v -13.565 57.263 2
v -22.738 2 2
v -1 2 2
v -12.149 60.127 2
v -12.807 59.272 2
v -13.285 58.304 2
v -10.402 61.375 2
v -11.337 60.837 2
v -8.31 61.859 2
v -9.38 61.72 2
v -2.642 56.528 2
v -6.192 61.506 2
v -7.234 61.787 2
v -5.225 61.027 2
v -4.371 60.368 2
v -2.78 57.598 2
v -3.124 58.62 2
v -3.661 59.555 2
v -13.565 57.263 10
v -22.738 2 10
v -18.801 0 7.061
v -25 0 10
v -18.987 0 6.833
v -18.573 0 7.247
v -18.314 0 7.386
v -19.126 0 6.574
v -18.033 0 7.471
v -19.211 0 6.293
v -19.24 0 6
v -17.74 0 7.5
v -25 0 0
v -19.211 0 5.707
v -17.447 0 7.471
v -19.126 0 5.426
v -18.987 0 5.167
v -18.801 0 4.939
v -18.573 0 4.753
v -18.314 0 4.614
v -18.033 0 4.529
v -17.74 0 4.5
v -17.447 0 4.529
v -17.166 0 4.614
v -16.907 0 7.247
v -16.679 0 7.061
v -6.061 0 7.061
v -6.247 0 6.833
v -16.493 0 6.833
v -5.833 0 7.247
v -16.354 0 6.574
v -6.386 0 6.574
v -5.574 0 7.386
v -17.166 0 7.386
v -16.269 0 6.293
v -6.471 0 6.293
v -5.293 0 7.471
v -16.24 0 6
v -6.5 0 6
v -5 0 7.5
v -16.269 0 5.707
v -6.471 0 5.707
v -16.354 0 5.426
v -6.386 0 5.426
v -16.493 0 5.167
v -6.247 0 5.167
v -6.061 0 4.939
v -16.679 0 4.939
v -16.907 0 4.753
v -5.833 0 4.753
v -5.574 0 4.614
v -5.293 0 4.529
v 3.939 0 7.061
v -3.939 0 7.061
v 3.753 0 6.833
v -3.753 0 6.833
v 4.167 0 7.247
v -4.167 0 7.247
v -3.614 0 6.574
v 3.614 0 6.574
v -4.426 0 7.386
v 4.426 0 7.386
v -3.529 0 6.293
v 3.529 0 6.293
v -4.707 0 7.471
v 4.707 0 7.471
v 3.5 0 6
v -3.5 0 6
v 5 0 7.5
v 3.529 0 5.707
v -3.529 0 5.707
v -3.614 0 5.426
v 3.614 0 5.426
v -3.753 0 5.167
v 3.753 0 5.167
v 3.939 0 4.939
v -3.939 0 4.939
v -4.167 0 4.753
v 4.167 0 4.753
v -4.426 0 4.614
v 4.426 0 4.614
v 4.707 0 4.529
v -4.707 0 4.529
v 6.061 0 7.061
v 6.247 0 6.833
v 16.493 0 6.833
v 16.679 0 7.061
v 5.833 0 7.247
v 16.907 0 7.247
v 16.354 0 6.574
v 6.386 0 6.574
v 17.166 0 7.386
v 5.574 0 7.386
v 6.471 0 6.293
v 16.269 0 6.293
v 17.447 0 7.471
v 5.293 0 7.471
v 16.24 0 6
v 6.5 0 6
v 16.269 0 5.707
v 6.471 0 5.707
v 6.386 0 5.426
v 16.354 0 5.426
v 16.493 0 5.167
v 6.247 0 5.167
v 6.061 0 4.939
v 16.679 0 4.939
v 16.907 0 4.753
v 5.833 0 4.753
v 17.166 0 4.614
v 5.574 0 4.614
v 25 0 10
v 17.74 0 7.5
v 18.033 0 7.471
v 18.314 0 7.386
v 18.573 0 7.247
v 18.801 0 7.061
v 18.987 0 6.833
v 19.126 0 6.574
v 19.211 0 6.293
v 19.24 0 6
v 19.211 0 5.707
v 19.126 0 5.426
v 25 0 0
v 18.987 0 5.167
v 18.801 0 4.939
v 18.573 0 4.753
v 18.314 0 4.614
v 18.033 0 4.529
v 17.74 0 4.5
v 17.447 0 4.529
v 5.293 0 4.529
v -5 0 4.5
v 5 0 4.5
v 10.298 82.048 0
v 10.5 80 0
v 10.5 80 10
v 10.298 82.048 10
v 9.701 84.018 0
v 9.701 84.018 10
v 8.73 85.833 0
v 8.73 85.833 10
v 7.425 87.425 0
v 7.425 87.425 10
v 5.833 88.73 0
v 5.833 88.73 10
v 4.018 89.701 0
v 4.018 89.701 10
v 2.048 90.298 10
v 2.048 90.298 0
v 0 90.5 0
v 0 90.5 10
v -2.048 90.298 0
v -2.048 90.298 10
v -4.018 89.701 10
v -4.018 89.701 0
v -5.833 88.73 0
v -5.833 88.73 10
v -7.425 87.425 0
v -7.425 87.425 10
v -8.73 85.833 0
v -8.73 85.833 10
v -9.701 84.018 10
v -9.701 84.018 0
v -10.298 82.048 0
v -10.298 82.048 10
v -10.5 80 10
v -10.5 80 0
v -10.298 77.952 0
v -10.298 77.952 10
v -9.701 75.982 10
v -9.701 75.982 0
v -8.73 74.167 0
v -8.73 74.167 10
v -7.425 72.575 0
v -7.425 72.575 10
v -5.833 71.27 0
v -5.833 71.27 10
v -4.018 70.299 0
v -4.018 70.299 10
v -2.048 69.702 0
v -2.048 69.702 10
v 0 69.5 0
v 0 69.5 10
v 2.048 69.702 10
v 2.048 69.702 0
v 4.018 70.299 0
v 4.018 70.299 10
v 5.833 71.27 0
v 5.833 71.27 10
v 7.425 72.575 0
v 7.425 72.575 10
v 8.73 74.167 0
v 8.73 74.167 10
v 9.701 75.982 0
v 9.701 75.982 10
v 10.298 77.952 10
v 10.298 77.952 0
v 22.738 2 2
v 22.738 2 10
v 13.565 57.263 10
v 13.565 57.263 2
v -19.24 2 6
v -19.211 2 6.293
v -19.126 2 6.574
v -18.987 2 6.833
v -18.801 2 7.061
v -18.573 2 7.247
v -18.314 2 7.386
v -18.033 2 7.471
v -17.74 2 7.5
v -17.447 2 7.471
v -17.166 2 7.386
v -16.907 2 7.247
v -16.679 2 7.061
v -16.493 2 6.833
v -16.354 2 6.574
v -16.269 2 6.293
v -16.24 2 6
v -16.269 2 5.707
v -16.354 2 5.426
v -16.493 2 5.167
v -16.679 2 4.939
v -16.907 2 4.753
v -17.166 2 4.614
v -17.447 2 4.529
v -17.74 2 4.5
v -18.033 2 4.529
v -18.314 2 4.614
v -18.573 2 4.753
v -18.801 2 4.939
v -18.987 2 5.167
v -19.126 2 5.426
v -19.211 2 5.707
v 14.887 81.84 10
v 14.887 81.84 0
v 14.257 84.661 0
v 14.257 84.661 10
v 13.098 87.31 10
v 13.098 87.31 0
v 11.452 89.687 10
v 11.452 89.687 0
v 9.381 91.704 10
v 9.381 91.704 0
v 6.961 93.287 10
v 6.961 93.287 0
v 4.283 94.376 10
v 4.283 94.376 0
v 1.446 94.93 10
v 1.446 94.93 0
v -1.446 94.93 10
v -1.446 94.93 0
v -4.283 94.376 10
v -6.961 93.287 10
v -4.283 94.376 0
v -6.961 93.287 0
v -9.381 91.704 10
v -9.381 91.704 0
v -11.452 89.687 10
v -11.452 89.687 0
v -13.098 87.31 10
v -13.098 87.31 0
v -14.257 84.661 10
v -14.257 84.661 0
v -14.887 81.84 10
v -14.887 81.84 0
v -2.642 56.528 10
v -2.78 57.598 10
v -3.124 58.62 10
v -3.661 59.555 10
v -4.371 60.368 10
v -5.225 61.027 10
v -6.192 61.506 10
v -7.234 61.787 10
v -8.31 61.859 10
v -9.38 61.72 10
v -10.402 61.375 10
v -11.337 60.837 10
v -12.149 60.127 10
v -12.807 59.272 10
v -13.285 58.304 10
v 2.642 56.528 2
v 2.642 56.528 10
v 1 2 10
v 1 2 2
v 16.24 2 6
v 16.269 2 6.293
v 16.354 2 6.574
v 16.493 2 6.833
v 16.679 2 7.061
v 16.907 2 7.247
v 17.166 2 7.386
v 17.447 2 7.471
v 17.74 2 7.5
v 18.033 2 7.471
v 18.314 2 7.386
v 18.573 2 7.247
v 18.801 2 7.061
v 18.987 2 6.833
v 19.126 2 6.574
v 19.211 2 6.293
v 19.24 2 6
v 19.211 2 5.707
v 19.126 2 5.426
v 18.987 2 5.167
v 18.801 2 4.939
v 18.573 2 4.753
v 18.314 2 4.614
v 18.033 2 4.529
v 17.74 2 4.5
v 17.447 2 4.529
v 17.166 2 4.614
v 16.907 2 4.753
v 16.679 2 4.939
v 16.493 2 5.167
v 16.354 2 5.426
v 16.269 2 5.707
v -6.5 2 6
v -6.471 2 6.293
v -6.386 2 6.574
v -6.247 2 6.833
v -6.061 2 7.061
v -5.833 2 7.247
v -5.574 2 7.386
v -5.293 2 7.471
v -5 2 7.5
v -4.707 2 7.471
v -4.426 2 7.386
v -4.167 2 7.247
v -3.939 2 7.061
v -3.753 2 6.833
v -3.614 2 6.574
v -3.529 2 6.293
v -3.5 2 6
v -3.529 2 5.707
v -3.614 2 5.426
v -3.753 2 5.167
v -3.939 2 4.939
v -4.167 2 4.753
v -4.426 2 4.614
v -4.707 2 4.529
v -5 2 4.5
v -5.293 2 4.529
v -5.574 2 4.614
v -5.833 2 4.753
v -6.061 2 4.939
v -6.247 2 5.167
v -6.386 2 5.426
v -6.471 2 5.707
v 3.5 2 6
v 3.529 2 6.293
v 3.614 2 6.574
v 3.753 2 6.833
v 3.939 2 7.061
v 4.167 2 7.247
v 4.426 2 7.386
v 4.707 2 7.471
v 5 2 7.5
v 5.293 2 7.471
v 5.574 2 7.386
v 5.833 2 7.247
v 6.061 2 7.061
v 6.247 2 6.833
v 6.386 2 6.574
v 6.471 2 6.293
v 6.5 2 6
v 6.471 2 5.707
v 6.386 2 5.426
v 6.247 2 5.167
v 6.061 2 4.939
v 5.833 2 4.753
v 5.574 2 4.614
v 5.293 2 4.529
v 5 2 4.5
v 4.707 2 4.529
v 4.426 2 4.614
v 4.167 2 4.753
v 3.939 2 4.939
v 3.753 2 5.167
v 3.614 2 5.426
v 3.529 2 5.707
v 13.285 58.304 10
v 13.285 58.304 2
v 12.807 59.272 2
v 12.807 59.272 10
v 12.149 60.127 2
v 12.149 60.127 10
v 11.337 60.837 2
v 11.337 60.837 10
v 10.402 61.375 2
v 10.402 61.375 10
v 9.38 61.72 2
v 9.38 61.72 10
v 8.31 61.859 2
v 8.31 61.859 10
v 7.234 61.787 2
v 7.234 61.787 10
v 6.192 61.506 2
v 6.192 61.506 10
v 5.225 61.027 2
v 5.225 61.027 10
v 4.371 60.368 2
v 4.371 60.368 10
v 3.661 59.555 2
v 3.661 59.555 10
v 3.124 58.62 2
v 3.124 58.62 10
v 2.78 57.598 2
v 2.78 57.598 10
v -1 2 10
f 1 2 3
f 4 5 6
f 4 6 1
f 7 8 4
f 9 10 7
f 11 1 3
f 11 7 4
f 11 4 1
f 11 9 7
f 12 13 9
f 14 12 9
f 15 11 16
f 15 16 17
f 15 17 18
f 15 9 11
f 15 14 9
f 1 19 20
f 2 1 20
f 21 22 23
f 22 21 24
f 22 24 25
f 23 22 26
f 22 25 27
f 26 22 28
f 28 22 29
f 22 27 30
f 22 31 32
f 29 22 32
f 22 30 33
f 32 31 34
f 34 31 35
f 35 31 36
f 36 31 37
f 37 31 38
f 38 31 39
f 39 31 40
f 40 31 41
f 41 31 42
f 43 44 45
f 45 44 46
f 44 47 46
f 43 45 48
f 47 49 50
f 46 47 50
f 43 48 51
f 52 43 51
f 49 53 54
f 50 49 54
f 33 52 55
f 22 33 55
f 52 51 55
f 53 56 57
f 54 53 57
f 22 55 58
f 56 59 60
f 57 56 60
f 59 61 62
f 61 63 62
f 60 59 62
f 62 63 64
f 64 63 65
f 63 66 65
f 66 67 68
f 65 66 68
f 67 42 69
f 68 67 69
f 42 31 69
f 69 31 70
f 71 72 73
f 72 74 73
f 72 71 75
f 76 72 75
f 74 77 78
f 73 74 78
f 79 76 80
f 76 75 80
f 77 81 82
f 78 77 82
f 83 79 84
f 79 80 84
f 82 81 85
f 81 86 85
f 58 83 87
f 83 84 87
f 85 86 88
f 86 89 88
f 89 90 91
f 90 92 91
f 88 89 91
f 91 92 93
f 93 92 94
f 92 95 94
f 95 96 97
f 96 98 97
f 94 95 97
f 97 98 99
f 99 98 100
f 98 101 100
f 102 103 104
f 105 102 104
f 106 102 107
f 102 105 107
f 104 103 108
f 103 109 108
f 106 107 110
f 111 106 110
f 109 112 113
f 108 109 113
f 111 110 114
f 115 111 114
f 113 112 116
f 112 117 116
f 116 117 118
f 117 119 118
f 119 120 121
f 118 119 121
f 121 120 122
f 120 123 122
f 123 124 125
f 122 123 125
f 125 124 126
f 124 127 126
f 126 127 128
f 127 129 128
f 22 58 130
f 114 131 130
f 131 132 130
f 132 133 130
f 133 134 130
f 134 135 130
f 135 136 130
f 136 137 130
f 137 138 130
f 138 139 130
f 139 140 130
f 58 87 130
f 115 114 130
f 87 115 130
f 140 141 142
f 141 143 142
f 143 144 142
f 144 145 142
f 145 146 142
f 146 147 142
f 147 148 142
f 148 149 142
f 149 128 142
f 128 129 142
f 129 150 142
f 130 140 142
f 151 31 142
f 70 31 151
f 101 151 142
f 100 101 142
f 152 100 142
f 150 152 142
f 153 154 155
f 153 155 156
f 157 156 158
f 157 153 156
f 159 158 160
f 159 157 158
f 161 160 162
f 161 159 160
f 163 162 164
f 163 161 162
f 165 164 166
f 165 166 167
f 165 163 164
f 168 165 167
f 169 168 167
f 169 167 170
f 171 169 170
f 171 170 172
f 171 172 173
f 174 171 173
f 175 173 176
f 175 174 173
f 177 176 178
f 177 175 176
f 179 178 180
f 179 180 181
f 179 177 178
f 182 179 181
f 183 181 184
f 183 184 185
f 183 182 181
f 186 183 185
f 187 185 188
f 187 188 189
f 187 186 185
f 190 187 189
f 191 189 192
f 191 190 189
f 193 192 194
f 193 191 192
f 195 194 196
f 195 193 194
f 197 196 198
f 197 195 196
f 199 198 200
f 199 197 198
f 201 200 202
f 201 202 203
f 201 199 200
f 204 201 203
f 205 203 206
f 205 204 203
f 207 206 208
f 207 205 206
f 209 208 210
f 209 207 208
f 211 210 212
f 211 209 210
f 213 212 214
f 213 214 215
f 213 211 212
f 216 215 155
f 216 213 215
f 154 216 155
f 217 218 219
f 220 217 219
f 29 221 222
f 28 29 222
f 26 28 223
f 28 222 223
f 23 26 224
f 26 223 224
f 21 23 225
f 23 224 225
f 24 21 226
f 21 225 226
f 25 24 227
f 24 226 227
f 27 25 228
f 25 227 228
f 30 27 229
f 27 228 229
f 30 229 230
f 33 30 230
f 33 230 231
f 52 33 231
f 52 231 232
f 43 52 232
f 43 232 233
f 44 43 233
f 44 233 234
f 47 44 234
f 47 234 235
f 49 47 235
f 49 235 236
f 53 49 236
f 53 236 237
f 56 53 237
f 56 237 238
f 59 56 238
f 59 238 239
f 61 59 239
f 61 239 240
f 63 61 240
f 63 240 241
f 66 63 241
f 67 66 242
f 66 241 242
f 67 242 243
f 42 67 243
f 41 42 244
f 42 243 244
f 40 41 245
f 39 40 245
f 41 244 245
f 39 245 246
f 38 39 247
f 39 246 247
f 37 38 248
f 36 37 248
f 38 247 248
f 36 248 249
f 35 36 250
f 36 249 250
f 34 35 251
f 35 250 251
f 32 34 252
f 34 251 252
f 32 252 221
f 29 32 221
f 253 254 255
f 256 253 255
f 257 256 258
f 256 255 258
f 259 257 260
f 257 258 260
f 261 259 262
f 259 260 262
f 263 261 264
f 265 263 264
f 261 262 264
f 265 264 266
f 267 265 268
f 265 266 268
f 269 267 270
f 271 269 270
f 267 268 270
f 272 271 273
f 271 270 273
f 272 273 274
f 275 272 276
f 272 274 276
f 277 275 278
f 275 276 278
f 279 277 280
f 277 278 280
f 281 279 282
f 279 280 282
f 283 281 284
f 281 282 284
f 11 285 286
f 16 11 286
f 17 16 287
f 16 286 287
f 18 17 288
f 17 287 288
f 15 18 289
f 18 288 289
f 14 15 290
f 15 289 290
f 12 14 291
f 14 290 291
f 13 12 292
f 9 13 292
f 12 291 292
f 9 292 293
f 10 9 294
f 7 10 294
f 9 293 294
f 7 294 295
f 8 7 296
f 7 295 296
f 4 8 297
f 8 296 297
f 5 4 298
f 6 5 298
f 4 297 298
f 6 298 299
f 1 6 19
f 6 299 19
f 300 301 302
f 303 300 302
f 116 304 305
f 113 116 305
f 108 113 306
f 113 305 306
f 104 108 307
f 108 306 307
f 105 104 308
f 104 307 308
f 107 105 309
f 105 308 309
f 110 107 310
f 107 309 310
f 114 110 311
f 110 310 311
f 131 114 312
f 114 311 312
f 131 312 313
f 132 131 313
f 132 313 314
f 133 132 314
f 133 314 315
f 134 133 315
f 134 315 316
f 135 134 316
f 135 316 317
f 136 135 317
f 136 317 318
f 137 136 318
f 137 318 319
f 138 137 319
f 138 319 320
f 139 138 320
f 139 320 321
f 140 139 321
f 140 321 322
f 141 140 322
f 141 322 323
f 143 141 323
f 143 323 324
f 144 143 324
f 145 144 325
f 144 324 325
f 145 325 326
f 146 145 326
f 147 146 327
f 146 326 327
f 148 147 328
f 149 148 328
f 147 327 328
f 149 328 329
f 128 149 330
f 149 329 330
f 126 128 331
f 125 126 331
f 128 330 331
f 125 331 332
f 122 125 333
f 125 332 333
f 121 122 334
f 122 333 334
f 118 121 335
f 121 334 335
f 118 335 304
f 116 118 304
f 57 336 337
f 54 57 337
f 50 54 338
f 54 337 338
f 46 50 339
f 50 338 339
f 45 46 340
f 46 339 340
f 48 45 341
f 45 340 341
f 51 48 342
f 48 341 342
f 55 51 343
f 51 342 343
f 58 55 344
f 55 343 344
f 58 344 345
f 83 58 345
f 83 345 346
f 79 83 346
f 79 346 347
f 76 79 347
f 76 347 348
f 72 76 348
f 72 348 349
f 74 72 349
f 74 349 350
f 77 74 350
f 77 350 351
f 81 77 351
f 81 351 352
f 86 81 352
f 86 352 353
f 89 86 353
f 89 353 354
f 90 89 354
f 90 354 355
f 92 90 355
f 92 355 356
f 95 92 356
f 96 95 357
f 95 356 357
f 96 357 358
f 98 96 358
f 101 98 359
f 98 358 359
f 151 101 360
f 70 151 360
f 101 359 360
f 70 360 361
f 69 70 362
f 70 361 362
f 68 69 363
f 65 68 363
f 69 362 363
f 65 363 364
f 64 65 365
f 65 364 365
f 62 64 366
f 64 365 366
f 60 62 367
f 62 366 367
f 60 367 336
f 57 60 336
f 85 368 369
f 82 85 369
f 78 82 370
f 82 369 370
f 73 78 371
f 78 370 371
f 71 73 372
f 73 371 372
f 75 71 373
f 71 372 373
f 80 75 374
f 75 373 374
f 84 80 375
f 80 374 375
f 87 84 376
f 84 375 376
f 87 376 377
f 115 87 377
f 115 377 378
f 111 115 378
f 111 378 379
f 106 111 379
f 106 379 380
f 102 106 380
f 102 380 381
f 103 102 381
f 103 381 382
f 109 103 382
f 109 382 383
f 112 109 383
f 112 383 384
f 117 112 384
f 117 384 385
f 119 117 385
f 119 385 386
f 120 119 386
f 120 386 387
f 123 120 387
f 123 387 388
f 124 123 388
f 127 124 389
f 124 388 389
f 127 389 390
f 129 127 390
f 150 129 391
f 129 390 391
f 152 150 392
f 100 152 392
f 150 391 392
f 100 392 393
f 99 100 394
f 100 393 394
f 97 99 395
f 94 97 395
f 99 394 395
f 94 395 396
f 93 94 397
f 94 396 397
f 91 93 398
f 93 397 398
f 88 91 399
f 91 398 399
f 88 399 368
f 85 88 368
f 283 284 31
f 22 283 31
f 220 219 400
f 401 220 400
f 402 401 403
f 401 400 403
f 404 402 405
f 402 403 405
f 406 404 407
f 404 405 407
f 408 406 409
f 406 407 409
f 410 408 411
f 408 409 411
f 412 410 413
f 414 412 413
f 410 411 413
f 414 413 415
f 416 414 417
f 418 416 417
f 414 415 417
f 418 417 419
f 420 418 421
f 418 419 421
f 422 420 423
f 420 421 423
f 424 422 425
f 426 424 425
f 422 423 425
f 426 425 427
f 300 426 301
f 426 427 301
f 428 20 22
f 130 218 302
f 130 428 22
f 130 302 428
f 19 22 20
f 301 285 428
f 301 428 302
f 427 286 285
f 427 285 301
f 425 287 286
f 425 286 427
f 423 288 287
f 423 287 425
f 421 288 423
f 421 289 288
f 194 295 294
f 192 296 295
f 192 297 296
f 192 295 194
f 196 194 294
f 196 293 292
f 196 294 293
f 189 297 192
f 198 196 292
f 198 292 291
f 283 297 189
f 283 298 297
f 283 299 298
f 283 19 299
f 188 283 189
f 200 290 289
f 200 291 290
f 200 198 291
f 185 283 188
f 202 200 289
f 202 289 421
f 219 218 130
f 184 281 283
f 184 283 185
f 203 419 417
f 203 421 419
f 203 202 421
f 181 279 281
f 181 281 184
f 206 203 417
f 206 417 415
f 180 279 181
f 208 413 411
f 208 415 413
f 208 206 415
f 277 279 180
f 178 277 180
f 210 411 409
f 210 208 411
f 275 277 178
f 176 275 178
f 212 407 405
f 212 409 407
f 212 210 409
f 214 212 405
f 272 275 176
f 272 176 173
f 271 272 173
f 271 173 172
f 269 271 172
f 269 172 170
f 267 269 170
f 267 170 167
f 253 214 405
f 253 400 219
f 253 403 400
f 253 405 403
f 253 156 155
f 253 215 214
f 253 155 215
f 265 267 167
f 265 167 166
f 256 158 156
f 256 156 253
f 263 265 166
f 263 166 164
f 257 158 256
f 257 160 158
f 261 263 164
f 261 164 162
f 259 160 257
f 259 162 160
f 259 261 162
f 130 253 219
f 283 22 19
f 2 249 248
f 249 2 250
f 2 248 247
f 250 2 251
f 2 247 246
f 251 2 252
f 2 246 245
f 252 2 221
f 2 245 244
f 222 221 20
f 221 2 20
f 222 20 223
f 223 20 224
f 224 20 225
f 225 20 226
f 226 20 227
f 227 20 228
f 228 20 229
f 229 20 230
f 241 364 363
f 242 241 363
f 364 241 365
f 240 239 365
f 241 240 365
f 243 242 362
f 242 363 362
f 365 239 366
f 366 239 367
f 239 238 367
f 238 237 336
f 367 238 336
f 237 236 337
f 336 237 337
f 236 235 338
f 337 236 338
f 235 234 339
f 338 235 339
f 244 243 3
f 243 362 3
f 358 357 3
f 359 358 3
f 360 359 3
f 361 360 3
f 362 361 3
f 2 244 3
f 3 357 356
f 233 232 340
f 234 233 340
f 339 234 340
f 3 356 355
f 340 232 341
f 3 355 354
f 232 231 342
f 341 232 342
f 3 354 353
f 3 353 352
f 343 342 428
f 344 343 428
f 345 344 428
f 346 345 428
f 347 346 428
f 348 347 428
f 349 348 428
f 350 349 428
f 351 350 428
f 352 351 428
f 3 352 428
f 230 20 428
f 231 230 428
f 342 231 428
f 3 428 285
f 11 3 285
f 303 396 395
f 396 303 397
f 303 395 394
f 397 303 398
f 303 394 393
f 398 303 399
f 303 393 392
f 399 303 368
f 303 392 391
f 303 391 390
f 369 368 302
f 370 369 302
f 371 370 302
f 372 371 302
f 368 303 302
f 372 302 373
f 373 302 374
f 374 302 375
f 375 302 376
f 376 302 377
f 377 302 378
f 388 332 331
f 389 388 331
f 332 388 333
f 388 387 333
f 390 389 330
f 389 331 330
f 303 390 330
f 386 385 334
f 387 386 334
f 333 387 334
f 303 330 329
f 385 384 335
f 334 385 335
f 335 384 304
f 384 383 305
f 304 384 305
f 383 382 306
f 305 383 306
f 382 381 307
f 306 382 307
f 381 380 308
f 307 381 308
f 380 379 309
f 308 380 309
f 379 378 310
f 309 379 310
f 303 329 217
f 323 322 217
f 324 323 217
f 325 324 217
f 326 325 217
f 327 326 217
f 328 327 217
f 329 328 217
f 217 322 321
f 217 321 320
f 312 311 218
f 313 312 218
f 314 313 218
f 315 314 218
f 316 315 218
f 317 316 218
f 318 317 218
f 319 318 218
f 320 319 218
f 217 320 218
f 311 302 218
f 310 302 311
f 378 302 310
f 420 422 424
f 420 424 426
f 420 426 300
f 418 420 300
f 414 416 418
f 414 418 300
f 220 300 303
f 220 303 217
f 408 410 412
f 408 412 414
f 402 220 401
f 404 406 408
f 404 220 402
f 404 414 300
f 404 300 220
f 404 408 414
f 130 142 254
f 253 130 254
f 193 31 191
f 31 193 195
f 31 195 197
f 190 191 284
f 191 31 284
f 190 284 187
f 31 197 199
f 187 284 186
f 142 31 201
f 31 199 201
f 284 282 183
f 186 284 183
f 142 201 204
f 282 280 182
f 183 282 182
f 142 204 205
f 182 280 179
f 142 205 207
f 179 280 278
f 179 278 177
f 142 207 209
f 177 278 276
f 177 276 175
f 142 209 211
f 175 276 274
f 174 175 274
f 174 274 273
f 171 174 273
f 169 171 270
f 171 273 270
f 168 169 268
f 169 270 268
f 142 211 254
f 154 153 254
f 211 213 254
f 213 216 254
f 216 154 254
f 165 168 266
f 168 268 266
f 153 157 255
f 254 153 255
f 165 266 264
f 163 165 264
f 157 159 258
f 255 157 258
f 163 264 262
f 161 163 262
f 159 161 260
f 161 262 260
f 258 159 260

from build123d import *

# Parameters (mm, degrees)
SKETCH_1_R          = 10.5
EXTRUDE_1_DEPTH     = 10
CUT_EXTRUDE_2_DEPTH = 8
SKETCH_3_R          = 1.5
CUT_EXTRUDE_3_DEPTH = 97.81941954


with BuildPart() as part:
    # 草图1 → 凸台-拉伸1 (new body)
    with BuildSketch(Plane.XY):
        with BuildLine():
            Line((-25, 0), (25, 0))
            Line((25, 0), (14.88676655, 81.839614547))
            ThreePointArc((14.88676655, 81.839614547), (0, 95), (-14.88676655, 81.839614547))
            Line((-14.88676655, 81.839614547), (-25, 0))
        make_face()
        with Locations((0, 80)):
            Circle(SKETCH_1_R, mode=Mode.SUBTRACT)
    extrude(amount=EXTRUDE_1_DEPTH)

    # 草图2 → 切除-拉伸2 (cut)
    with BuildSketch(Plane.XY.offset(10)):
        with BuildLine():
            Line((-13.564970556, 57.262621959), (-22.737639737, 2))
            Line((-22.737639737, 2), (-1, 2))
            Line((-1, 2), (-2.641694958, 56.527552532))
            ThreePointArc((-2.641694958, 56.527552532), (-7.769922801, 61.84962447), (-13.564970556, 57.262621959))
        make_face()
        with BuildLine():
            Line((2.641694958, 56.527552532), (1, 2))
            Line((1, 2), (22.737639737, 2))
            Line((22.737639737, 2), (13.564970556, 57.262621959))
            ThreePointArc((13.564970556, 57.262621959), (7.769922801, 61.84962447), (2.641694958, 56.527552532))
        make_face()
    extrude(amount=-CUT_EXTRUDE_2_DEPTH, mode=Mode.SUBTRACT)

    # 草图3 → 切除-拉伸3 (cut, through all)
    with BuildSketch(Plane(origin=(0, 2, 0), x_dir=(1, 0, 0), z_dir=(0, 1, 0))):
        with Locations(Location((-17.74, -6, 0), (0, 0, 180))):
            Circle(SKETCH_3_R)
        with Locations(Location((-5, -6, 0), (0, 0, 180))):
            Circle(SKETCH_3_R)
        with Locations(Location((5, -6, 0), (0, 0, 180))):
            Circle(SKETCH_3_R)
        with Locations(Location((17.74, -6, 0), (0, 0, 180))):
            Circle(SKETCH_3_R)
    extrude(amount=-CUT_EXTRUDE_3_DEPTH, mode=Mode.SUBTRACT)


solid = part.part
